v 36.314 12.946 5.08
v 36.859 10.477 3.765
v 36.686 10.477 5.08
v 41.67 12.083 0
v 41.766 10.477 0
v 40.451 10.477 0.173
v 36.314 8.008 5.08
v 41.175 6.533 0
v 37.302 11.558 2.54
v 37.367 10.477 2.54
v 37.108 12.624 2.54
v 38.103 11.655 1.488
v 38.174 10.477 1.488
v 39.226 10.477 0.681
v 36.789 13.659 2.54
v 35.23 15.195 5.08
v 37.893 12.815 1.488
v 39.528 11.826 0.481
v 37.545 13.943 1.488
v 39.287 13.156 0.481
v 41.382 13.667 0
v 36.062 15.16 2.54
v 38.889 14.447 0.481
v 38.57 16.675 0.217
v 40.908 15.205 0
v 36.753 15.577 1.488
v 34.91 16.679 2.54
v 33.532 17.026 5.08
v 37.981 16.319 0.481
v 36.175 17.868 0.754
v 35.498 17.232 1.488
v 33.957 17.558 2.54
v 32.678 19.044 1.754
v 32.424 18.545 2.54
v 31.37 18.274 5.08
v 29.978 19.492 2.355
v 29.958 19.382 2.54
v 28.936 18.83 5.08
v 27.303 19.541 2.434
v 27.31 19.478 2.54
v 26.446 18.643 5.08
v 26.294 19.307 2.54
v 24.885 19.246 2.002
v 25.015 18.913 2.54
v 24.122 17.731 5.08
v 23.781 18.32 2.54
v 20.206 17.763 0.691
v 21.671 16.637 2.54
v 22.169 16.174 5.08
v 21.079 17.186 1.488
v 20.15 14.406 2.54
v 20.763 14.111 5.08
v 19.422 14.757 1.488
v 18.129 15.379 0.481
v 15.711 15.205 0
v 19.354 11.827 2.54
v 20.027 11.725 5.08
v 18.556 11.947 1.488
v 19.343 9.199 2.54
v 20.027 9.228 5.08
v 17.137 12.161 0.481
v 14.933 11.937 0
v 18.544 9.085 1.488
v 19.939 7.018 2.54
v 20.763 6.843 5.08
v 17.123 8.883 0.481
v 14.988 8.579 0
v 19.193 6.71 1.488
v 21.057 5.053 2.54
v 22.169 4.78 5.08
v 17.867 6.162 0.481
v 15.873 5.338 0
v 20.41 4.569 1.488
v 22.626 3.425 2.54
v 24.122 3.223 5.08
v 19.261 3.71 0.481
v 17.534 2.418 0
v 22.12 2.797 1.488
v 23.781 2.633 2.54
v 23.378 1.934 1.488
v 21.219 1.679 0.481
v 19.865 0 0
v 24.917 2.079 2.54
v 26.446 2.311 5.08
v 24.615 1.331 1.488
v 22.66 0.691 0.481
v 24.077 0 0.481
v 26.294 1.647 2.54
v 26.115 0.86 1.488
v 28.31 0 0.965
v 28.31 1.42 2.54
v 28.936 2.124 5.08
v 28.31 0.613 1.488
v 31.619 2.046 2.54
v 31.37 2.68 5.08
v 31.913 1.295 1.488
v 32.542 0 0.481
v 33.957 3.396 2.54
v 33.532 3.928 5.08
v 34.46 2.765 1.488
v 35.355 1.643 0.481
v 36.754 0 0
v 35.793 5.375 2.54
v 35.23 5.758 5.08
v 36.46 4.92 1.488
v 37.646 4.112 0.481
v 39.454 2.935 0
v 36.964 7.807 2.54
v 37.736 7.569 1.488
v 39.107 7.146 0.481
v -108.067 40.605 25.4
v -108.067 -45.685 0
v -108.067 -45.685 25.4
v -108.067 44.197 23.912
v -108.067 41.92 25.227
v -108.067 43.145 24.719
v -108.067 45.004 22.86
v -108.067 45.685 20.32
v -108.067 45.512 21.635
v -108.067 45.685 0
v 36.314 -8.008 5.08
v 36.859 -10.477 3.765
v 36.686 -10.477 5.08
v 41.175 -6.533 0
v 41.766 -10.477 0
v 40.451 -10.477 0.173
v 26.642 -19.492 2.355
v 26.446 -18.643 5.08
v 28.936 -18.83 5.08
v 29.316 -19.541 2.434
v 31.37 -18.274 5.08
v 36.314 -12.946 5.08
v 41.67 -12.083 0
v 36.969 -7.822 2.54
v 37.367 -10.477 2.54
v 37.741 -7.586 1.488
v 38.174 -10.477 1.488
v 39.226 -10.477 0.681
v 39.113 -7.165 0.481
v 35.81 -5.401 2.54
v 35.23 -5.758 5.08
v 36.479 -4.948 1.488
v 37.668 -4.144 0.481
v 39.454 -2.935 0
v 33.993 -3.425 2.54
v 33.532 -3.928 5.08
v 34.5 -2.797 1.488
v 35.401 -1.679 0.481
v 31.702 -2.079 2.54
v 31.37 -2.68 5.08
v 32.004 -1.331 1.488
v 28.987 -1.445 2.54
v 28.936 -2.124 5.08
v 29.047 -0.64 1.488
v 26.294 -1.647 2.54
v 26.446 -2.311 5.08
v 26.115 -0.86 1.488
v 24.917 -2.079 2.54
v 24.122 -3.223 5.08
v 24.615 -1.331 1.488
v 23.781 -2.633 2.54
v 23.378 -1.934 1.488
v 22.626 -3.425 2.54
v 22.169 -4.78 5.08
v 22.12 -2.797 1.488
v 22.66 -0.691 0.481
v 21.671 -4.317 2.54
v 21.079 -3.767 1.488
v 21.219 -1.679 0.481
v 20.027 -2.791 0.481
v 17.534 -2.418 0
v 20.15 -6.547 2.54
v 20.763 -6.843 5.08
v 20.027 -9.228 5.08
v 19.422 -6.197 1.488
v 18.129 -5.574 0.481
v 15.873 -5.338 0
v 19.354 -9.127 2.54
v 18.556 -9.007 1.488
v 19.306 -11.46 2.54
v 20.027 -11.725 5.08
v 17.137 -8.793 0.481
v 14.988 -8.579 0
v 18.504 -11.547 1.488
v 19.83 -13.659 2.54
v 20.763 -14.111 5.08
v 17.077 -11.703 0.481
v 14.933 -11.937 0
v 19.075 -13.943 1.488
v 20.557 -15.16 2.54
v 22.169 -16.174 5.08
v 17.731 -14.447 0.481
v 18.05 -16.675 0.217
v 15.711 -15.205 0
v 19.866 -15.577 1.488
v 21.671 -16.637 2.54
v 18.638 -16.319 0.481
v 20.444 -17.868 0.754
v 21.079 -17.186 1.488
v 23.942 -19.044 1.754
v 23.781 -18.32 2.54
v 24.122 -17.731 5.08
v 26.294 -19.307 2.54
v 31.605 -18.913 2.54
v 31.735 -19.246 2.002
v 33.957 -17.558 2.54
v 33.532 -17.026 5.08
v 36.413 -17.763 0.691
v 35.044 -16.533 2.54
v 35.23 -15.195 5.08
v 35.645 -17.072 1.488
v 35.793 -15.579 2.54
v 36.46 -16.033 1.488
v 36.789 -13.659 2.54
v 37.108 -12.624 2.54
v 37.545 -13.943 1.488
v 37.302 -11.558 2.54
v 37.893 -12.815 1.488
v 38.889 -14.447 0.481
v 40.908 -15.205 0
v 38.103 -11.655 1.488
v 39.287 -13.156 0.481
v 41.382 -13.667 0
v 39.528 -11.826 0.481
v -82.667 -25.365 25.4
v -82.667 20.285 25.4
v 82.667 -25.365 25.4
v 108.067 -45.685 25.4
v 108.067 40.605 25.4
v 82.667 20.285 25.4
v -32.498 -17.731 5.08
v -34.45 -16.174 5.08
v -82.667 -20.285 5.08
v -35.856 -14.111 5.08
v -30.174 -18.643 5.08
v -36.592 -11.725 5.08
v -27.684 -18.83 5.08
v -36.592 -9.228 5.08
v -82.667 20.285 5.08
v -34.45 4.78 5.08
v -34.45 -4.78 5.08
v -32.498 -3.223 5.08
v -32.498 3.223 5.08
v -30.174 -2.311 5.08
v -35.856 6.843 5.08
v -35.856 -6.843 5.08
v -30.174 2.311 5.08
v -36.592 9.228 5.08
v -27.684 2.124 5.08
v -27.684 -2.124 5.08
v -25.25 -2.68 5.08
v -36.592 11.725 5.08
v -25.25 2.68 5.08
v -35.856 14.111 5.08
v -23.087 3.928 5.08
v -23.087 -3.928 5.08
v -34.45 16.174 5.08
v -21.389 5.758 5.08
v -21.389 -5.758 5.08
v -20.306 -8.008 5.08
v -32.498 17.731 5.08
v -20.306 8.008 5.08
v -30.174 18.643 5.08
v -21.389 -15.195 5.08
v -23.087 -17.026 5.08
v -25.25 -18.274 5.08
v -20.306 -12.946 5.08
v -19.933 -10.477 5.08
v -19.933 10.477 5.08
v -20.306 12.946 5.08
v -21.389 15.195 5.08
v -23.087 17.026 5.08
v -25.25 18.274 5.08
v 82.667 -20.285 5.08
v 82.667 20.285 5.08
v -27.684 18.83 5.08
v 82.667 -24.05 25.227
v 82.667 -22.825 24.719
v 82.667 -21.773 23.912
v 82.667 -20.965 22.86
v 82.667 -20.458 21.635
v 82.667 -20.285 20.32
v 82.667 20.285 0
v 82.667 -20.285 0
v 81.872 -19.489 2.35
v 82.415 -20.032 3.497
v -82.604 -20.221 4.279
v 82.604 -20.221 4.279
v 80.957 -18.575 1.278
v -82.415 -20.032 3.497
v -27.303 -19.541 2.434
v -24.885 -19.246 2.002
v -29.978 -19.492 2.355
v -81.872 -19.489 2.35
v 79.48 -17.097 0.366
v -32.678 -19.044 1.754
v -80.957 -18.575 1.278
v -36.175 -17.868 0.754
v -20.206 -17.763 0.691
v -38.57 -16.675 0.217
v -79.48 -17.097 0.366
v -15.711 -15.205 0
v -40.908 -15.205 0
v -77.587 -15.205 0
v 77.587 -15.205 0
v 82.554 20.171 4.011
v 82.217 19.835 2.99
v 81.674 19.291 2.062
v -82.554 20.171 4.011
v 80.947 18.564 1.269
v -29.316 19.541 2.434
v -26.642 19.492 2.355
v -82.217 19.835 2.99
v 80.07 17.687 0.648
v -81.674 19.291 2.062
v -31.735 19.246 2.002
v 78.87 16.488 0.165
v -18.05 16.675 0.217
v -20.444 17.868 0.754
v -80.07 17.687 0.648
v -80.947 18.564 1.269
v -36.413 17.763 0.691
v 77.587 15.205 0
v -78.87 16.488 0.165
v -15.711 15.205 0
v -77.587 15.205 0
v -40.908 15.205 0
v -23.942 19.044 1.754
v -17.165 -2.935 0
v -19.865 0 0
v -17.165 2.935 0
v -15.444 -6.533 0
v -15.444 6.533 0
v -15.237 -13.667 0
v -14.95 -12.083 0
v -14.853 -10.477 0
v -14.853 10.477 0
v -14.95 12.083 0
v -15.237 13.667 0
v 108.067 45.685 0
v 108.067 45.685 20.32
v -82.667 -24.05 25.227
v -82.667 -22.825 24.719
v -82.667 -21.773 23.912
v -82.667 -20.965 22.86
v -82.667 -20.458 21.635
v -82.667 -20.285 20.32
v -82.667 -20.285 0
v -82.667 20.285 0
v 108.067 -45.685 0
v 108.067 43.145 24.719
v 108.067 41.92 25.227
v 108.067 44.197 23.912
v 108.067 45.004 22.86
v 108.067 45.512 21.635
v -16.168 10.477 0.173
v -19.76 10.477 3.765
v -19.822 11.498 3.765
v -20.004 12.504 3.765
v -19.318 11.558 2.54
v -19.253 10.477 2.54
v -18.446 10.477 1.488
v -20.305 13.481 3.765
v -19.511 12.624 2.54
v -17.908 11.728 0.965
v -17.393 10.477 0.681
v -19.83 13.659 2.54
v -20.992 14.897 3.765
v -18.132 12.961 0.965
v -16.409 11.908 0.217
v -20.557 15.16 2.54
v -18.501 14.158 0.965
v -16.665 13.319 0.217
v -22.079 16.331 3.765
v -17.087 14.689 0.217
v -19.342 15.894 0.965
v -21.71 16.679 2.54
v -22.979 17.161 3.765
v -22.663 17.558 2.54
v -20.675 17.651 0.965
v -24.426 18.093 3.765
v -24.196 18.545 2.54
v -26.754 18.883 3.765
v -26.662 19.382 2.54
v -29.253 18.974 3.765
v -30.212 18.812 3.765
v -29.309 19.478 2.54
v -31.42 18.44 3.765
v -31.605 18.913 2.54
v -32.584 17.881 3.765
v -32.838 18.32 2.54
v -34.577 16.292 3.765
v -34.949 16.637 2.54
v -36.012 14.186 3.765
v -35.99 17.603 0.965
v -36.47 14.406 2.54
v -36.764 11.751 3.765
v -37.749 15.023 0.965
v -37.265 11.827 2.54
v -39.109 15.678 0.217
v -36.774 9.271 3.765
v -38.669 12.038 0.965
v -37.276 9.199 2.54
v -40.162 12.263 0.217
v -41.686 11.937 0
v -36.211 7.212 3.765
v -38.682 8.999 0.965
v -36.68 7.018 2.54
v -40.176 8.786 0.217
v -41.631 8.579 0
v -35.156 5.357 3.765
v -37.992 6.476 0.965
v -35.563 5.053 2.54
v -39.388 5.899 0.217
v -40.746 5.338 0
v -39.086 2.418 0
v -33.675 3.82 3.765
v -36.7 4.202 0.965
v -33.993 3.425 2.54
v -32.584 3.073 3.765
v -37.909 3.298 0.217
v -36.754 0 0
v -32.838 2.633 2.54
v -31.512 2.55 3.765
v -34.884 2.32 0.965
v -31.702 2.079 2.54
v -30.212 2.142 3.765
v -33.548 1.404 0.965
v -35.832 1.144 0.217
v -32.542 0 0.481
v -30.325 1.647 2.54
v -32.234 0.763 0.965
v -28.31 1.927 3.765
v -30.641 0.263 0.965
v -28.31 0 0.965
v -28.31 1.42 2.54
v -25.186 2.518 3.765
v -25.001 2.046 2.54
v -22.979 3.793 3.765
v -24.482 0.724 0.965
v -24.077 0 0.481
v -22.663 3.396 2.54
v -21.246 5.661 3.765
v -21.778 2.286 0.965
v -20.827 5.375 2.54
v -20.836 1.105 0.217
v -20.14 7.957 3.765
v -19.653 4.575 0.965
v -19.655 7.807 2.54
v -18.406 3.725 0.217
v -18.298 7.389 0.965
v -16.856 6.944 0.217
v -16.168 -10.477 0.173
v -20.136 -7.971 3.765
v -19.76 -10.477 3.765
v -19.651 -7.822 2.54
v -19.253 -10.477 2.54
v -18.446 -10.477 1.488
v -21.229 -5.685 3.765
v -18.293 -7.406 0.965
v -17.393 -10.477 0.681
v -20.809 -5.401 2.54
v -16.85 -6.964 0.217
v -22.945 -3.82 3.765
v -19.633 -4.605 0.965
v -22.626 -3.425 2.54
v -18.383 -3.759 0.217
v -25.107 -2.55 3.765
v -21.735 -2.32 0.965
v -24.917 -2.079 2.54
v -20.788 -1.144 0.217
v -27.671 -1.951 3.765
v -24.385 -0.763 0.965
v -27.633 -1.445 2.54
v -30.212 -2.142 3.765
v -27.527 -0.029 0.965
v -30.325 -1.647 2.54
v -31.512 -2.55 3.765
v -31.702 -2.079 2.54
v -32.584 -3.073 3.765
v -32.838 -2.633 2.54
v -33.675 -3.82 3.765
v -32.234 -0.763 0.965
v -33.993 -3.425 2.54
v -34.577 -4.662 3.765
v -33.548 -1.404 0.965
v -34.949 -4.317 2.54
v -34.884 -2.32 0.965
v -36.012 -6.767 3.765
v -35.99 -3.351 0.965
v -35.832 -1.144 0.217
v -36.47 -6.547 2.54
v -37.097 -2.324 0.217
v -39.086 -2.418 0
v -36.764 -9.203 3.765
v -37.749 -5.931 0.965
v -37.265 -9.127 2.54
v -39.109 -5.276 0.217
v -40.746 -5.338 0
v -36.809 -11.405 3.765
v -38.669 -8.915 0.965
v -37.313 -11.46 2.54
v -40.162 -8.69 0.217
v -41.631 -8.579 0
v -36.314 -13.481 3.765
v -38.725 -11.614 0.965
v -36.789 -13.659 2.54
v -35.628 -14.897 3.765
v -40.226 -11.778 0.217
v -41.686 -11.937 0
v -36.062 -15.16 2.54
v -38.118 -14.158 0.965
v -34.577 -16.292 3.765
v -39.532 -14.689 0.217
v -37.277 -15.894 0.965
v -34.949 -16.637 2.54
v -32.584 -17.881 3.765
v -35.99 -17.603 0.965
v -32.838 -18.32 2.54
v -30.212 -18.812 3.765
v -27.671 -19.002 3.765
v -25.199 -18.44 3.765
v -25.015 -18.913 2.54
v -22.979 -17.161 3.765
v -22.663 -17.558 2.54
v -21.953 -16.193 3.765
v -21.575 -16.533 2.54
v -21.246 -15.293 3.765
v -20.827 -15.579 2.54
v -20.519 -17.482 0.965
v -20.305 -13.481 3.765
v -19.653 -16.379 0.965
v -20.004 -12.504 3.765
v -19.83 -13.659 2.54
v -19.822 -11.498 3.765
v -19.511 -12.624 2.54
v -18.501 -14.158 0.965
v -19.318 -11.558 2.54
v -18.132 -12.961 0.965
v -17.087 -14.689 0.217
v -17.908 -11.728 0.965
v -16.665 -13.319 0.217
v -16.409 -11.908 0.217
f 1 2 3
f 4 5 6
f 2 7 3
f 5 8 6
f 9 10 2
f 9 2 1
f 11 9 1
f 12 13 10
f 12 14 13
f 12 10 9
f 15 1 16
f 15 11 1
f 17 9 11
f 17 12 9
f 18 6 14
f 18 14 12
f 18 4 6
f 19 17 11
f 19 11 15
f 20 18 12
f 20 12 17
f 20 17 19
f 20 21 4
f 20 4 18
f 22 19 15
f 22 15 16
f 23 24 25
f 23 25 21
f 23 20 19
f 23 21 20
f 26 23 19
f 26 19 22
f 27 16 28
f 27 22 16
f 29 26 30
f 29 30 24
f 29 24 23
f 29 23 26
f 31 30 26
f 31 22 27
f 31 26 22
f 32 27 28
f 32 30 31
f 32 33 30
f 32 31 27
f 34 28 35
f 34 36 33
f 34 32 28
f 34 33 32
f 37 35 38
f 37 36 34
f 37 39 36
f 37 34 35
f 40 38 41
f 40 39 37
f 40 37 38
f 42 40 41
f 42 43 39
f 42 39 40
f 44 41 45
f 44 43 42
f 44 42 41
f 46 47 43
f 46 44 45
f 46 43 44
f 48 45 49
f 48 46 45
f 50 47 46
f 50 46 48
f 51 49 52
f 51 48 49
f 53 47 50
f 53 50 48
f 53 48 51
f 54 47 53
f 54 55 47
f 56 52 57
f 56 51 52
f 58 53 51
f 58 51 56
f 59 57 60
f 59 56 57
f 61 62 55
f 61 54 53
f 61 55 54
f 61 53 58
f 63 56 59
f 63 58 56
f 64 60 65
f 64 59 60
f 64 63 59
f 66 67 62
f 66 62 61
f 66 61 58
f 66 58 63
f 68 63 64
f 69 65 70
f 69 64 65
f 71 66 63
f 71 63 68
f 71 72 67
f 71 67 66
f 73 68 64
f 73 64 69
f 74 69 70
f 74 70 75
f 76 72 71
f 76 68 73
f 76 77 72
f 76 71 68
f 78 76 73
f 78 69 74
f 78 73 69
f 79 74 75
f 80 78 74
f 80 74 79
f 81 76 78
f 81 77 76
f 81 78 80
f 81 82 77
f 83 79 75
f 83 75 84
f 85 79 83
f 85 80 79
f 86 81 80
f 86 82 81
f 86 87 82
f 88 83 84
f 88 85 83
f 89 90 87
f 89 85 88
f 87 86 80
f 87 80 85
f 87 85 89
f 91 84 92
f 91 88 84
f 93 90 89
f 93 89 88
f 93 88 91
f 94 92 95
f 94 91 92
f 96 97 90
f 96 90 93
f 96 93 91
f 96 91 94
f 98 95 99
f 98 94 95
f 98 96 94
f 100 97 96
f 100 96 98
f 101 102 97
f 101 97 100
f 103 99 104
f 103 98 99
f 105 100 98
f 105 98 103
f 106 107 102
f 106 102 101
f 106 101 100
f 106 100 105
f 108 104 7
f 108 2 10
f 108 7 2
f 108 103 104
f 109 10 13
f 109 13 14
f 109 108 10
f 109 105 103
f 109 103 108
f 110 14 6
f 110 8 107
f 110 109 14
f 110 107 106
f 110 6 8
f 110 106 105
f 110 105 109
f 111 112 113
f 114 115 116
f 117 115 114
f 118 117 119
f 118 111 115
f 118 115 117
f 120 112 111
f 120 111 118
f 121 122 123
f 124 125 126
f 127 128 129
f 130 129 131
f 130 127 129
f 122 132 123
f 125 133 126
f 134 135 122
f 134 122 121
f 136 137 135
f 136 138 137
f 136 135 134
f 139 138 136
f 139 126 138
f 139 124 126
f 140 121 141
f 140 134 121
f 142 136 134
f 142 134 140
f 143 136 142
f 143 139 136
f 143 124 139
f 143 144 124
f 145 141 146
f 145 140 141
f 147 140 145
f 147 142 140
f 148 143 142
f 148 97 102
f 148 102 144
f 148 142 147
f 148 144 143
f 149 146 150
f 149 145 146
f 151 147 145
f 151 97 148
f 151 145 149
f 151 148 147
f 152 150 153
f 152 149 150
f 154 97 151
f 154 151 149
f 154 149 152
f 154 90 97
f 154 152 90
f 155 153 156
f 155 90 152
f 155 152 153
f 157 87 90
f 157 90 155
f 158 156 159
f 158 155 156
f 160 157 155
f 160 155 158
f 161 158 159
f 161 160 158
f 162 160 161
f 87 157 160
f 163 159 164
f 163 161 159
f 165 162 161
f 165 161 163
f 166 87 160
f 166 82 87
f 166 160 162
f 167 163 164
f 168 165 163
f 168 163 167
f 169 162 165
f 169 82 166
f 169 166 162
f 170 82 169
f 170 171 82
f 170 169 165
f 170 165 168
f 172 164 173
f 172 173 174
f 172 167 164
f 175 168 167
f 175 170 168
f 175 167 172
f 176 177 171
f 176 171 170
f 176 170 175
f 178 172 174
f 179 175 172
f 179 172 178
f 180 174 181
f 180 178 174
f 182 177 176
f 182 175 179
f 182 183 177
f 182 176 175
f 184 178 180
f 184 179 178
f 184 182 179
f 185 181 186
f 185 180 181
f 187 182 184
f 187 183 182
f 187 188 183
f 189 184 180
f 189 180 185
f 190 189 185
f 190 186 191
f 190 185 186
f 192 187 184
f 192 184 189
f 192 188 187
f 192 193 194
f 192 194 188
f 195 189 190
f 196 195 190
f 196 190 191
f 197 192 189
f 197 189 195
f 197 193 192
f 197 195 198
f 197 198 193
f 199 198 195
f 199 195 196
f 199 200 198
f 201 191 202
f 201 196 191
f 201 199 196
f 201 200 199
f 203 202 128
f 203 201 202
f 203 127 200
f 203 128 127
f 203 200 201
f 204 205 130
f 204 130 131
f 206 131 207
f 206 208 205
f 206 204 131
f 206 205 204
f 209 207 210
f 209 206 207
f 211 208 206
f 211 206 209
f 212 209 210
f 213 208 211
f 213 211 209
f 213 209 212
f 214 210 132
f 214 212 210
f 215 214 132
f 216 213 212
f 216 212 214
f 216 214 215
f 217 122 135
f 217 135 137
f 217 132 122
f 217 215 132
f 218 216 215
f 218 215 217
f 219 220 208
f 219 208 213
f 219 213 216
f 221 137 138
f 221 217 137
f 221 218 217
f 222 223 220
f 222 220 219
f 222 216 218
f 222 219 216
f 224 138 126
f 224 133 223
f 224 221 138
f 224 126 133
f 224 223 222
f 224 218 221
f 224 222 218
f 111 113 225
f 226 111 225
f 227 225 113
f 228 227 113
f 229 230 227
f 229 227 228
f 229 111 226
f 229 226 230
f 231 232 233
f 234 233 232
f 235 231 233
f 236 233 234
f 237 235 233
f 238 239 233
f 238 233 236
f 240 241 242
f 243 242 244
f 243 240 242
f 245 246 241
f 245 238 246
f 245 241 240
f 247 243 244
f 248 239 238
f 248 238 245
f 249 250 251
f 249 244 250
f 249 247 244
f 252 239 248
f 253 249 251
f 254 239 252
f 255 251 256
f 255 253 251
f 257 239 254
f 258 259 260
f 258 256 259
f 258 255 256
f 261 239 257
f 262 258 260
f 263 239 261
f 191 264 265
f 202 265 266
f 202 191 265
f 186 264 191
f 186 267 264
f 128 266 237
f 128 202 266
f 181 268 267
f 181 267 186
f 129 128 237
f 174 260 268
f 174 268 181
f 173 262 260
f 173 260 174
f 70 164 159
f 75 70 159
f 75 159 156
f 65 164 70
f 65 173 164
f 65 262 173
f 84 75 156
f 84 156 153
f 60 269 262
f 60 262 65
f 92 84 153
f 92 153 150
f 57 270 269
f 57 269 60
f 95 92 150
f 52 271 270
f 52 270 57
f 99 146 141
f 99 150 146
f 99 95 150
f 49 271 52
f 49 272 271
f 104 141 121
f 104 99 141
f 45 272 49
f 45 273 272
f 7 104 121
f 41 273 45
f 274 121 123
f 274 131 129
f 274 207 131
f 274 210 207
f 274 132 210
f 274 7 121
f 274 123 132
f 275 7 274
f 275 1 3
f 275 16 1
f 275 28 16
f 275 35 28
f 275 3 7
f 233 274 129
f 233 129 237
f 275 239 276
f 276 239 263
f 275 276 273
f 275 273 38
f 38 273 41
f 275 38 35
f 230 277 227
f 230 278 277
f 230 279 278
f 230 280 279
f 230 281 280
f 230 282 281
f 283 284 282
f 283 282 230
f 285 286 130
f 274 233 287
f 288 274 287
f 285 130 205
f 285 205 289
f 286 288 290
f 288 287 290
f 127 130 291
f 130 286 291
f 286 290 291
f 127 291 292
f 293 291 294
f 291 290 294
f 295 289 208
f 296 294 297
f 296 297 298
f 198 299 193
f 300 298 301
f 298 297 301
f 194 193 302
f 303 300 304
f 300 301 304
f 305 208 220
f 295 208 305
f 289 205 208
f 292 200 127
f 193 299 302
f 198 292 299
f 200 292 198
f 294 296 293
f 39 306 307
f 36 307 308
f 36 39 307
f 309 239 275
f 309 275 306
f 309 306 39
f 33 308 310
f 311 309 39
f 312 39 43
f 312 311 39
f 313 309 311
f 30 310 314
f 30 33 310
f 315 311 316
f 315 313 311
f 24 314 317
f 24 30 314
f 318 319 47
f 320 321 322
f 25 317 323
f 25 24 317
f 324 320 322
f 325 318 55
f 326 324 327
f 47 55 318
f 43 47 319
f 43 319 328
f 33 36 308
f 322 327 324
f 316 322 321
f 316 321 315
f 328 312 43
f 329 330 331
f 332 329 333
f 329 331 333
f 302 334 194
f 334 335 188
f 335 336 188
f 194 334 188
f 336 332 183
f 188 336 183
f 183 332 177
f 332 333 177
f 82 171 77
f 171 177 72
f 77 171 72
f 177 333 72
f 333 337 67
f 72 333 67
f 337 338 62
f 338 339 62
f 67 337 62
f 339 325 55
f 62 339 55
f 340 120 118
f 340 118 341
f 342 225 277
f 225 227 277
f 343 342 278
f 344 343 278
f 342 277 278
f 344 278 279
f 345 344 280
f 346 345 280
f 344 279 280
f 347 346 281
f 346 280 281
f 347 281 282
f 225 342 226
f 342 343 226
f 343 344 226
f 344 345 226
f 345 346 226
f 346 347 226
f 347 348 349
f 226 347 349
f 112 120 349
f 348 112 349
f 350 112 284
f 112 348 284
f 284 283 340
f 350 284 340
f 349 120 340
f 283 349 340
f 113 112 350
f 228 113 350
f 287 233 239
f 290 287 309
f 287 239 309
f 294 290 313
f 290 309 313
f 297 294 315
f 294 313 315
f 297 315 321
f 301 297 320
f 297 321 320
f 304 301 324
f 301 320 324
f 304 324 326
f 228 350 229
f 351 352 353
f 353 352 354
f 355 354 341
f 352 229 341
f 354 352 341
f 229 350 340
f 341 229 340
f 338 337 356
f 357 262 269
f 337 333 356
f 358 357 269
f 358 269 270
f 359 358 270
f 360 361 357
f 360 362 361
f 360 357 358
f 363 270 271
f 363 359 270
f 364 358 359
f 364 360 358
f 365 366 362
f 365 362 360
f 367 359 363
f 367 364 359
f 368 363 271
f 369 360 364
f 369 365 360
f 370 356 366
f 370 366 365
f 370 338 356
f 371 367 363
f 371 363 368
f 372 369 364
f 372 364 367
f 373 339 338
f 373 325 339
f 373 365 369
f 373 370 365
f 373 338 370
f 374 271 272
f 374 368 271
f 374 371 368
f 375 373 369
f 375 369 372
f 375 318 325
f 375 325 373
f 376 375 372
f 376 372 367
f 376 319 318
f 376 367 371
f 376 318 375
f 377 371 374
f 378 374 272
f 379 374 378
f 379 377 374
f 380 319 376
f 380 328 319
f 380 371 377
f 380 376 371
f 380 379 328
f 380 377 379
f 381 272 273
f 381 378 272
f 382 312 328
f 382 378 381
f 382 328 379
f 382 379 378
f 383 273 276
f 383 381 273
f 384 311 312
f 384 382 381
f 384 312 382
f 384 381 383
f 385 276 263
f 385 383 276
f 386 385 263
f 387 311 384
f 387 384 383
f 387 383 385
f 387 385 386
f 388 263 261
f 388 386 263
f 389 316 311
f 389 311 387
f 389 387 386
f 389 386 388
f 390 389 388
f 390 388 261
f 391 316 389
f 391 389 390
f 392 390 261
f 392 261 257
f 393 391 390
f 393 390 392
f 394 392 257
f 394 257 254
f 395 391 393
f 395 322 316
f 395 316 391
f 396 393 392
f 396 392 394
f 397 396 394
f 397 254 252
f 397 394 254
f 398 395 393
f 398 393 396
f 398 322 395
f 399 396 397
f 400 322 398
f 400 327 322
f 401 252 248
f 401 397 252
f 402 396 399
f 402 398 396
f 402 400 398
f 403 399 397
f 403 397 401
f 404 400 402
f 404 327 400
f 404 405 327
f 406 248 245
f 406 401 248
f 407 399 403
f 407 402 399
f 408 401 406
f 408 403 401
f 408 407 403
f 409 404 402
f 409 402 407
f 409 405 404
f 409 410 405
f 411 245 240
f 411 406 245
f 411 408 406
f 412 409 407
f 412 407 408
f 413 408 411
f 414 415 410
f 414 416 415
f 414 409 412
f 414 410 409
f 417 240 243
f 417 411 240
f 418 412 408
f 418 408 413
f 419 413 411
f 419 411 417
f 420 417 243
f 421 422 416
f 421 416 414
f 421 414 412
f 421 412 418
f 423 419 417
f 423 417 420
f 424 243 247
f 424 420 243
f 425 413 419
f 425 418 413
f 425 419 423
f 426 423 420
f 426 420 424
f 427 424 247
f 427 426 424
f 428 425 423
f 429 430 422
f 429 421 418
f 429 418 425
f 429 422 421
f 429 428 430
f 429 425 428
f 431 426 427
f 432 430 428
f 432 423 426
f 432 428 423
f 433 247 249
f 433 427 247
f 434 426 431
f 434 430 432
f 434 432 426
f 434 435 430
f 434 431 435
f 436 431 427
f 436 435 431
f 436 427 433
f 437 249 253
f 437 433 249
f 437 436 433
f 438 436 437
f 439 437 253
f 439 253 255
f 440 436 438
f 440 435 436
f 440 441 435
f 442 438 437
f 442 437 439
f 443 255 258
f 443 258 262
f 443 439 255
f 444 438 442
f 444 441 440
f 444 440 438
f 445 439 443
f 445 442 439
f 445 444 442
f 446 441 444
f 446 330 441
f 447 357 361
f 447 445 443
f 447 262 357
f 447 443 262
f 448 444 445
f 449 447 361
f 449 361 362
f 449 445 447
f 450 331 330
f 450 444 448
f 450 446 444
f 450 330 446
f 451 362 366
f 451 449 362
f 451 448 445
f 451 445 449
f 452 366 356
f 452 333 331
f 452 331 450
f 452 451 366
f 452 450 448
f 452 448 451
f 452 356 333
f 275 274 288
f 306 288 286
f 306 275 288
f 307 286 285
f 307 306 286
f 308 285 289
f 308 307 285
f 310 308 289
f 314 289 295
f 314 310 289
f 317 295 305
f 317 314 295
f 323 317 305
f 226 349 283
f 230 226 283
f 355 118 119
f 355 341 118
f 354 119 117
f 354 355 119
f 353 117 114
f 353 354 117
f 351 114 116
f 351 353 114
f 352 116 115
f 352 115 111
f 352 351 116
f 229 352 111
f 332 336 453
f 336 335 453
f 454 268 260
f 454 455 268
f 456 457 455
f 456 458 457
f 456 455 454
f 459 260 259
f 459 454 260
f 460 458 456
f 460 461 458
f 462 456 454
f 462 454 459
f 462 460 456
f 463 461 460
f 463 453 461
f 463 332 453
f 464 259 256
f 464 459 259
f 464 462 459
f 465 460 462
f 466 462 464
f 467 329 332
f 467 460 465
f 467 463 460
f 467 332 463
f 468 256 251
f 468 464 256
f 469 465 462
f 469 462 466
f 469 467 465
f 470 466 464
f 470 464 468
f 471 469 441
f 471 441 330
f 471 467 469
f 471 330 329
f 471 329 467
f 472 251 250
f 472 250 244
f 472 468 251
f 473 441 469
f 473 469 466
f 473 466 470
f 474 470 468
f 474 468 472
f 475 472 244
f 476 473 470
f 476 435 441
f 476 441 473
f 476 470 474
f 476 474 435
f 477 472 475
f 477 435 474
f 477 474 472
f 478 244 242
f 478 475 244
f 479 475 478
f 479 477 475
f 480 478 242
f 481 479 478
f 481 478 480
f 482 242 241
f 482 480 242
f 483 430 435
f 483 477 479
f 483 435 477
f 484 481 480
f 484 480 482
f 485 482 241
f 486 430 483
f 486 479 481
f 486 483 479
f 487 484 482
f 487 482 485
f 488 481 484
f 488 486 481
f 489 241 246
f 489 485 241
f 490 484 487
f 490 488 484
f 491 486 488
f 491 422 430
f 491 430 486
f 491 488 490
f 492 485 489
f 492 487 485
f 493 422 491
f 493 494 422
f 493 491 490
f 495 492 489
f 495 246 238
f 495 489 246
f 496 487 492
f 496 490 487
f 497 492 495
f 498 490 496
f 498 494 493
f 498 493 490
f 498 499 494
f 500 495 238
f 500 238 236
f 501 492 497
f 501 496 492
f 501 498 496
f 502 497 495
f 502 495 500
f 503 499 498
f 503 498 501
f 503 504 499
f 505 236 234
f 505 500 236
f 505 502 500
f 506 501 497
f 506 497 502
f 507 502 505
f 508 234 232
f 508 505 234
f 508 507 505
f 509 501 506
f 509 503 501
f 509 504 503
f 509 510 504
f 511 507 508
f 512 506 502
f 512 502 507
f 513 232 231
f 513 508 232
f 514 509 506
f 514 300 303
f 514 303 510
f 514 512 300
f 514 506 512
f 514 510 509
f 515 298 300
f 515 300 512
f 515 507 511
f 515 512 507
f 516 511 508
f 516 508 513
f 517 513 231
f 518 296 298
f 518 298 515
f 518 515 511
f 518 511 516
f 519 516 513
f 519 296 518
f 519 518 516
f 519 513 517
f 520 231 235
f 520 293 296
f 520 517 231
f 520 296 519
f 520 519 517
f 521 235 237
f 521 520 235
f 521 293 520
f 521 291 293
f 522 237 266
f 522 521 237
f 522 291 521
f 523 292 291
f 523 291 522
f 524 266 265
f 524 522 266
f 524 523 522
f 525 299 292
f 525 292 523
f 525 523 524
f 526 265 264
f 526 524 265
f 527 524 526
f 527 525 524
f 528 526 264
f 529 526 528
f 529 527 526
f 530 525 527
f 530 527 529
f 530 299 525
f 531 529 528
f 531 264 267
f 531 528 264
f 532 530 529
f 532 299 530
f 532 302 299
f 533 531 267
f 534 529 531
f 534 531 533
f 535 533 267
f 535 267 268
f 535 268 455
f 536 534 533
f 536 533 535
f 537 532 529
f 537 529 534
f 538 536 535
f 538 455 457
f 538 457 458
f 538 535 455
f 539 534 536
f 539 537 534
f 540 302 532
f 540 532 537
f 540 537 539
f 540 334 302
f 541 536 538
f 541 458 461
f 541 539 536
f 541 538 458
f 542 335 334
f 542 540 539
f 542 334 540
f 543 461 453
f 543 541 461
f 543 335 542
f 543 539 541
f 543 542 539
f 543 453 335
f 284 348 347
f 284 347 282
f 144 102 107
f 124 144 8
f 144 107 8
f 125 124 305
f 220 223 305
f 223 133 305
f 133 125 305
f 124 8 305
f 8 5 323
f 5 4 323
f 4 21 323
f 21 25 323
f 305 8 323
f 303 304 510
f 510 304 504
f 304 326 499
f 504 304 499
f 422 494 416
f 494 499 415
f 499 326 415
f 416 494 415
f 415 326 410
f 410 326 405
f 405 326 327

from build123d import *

# Parameters (mm, degrees)
F0_W        = 216.1347998985
F0_H        = 91.3698120594
F0_W_2      = 165.3347998985
F0_H_2      = 40.5698120594
F1_DEPTH    = 25.4
F0_R        = 8.376235911
F2_DEPTH    = 5.08
F3_T1_DEPTH = 190.7347998985
F3_T3_DEPTH = 65.9698120594
F3_2_F1_R   = 5.08
F3_2_F2_R   = 5.08


# Not quite as in the source:
# - a fillet or chamfer that OpenCascade refuses, or shapes differently, is made with other operations: its cross-section is extruded or revolved along the edge and cut away or added


with BuildPart() as f1:
    # F0 (on Top) → F1 (new body)
    with BuildSketch(Plane.XY):
        Rectangle(F0_W, F0_H)
        Rectangle(F0_W_2, F0_H_2, mode=Mode.SUBTRACT)
    extrude(amount=F1_DEPTH)

    # F3#2: fillet of radius 5.08 on 2 edges, made by hand

    # F3_2_f1
    f3_2_f1_edges = [f1.edges().sort_by_distance(p)[0] for p in [
        (0, 45.6849060297, 25.4),
    ]]
    fillet(f3_2_f1_edges, radius=F3_2_F1_R)

    # F3_2_f2
    f3_2_f2_edges = [f1.edges().sort_by_distance(p)[0] for p in [
        (0, -20.2849060297, 25.4),
    ]]
    fillet(f3_2_f2_edges, radius=F3_2_F2_R)


with BuildPart() as f2:
    # F0 (on Top) → F2 (new body)
    with BuildSketch(Plane.XY):
        Rectangle(F0_W_2, F0_H_2)
        with Locations((-28.30969356, -10.4768136516)):
            Circle(F0_R, mode=Mode.SUBTRACT)
        with Locations((28.30969356, -10.4768136516)):
            Circle(F0_R, mode=Mode.SUBTRACT)
        with Locations((-28.30969356, 10.4768136516)):
            Circle(F0_R, mode=Mode.SUBTRACT)
        with Locations((28.30969356, 10.4768136516)):
            Circle(F0_R, mode=Mode.SUBTRACT)
    extrude(amount=F2_DEPTH)

    # F3: fillet of radius 5.08 on 8 edges, made by hand

    # F3_s2 → F3_t1 (cut)
    with BuildSketch(Plane.YZ.offset(-95.3673999493)):
        with BuildLine():
            ThreePointArc((-20.2849060297, 5.08), (-18.7970084781, 1.4878975516), (-15.2049060297, 0))
            Line((-15.2049060297, 0), (-20.2849060297, 0))
            Line((-20.2849060297, 0), (-20.2849060297, 5.08))
        make_face()
        with BuildLine():
            ThreePointArc((20.2849060297, 5.08), (18.7970084781, 1.4878975516), (15.2049060297, 0))
            Line((15.2049060297, 0), (20.2849060297, 0))
            Line((20.2849060297, 0), (20.2849060297, 5.08))
        make_face()
    extrude(amount=F3_T1_DEPTH, mode=Mode.SUBTRACT)

    # F3_s4 → F3_t3 (cut)
    with BuildSketch(Plane.XZ.offset(-32.9849060297)):
        with BuildLine():
            ThreePointArc((82.6673999493, 5.08), (81.1795023977, 1.4878975516), (77.5873999493, 0))
            Line((77.5873999493, 0), (82.6673999493, 0))
            Line((82.6673999493, 0), (82.6673999493, 5.08))
        make_face()
        with BuildLine():
            ThreePointArc((-82.6673999493, 5.08), (-81.1795023977, 1.4878975516), (-77.5873999493, 0))
            Line((-77.5873999493, 0), (-82.6673999493, 0))
            Line((-82.6673999493, 0), (-82.6673999493, 5.08))
        make_face()
    extrude(amount=F3_T3_DEPTH, mode=Mode.SUBTRACT)

    # F3_s5 → F3_t6 (revolve, cut)
    with BuildSketch(Plane.XZ.offset(10.4768136516)):
        with BuildLine():
            ThreePointArc((-19.933457649, 5.08), (-18.4455600975, 1.4878975516), (-14.853457649, 0))
            Line((-14.853457649, 0), (-19.933457649, 0))
            Line((-19.933457649, 0), (-19.933457649, 5.08))
        make_face()
    revolve(axis=Axis((-28.30969356, -10.4768136516, 0), (0, 0, 1)), mode=Mode.SUBTRACT)

    # F3_s7 → F3_t8 (revolve, cut)
    with BuildSketch(Plane.XZ.offset(10.4768136516)):
        with BuildLine():
            ThreePointArc((36.685929471, 5.08), (38.1738270226, 1.4878975516), (41.765929471, 0))
            Line((41.765929471, 0), (36.685929471, 0))
            Line((36.685929471, 0), (36.685929471, 5.08))
        make_face()
    revolve(axis=Axis((28.30969356, -10.4768136516, 0), (0, 0, 1)), mode=Mode.SUBTRACT)

    # F3_s9 → F3_t10 (revolve, cut)
    with BuildSketch(Plane.XZ.offset(-10.4768136516)):
        with BuildLine():
            ThreePointArc((-19.933457649, 5.08), (-18.4455600975, 1.4878975516), (-14.853457649, 0))
            Line((-14.853457649, 0), (-19.933457649, 0))
            Line((-19.933457649, 0), (-19.933457649, 5.08))
        make_face()
    revolve(axis=Axis((-28.30969356, 10.4768136516, 0), (0, 0, 1)), mode=Mode.SUBTRACT)

    # F3_s11 → F3_t12 (revolve, cut)
    with BuildSketch(Plane.XZ.offset(-10.4768136516)):
        with BuildLine():
            ThreePointArc((36.685929471, 5.08), (38.1738270226, 1.4878975516), (41.765929471, 0))
            Line((41.765929471, 0), (36.685929471, 0))
            Line((36.685929471, 0), (36.685929471, 5.08))
        make_face()
    revolve(axis=Axis((28.30969356, 10.4768136516, 0), (0, 0, 1)), mode=Mode.SUBTRACT)


solid = Compound([f1.part, f2.part])
